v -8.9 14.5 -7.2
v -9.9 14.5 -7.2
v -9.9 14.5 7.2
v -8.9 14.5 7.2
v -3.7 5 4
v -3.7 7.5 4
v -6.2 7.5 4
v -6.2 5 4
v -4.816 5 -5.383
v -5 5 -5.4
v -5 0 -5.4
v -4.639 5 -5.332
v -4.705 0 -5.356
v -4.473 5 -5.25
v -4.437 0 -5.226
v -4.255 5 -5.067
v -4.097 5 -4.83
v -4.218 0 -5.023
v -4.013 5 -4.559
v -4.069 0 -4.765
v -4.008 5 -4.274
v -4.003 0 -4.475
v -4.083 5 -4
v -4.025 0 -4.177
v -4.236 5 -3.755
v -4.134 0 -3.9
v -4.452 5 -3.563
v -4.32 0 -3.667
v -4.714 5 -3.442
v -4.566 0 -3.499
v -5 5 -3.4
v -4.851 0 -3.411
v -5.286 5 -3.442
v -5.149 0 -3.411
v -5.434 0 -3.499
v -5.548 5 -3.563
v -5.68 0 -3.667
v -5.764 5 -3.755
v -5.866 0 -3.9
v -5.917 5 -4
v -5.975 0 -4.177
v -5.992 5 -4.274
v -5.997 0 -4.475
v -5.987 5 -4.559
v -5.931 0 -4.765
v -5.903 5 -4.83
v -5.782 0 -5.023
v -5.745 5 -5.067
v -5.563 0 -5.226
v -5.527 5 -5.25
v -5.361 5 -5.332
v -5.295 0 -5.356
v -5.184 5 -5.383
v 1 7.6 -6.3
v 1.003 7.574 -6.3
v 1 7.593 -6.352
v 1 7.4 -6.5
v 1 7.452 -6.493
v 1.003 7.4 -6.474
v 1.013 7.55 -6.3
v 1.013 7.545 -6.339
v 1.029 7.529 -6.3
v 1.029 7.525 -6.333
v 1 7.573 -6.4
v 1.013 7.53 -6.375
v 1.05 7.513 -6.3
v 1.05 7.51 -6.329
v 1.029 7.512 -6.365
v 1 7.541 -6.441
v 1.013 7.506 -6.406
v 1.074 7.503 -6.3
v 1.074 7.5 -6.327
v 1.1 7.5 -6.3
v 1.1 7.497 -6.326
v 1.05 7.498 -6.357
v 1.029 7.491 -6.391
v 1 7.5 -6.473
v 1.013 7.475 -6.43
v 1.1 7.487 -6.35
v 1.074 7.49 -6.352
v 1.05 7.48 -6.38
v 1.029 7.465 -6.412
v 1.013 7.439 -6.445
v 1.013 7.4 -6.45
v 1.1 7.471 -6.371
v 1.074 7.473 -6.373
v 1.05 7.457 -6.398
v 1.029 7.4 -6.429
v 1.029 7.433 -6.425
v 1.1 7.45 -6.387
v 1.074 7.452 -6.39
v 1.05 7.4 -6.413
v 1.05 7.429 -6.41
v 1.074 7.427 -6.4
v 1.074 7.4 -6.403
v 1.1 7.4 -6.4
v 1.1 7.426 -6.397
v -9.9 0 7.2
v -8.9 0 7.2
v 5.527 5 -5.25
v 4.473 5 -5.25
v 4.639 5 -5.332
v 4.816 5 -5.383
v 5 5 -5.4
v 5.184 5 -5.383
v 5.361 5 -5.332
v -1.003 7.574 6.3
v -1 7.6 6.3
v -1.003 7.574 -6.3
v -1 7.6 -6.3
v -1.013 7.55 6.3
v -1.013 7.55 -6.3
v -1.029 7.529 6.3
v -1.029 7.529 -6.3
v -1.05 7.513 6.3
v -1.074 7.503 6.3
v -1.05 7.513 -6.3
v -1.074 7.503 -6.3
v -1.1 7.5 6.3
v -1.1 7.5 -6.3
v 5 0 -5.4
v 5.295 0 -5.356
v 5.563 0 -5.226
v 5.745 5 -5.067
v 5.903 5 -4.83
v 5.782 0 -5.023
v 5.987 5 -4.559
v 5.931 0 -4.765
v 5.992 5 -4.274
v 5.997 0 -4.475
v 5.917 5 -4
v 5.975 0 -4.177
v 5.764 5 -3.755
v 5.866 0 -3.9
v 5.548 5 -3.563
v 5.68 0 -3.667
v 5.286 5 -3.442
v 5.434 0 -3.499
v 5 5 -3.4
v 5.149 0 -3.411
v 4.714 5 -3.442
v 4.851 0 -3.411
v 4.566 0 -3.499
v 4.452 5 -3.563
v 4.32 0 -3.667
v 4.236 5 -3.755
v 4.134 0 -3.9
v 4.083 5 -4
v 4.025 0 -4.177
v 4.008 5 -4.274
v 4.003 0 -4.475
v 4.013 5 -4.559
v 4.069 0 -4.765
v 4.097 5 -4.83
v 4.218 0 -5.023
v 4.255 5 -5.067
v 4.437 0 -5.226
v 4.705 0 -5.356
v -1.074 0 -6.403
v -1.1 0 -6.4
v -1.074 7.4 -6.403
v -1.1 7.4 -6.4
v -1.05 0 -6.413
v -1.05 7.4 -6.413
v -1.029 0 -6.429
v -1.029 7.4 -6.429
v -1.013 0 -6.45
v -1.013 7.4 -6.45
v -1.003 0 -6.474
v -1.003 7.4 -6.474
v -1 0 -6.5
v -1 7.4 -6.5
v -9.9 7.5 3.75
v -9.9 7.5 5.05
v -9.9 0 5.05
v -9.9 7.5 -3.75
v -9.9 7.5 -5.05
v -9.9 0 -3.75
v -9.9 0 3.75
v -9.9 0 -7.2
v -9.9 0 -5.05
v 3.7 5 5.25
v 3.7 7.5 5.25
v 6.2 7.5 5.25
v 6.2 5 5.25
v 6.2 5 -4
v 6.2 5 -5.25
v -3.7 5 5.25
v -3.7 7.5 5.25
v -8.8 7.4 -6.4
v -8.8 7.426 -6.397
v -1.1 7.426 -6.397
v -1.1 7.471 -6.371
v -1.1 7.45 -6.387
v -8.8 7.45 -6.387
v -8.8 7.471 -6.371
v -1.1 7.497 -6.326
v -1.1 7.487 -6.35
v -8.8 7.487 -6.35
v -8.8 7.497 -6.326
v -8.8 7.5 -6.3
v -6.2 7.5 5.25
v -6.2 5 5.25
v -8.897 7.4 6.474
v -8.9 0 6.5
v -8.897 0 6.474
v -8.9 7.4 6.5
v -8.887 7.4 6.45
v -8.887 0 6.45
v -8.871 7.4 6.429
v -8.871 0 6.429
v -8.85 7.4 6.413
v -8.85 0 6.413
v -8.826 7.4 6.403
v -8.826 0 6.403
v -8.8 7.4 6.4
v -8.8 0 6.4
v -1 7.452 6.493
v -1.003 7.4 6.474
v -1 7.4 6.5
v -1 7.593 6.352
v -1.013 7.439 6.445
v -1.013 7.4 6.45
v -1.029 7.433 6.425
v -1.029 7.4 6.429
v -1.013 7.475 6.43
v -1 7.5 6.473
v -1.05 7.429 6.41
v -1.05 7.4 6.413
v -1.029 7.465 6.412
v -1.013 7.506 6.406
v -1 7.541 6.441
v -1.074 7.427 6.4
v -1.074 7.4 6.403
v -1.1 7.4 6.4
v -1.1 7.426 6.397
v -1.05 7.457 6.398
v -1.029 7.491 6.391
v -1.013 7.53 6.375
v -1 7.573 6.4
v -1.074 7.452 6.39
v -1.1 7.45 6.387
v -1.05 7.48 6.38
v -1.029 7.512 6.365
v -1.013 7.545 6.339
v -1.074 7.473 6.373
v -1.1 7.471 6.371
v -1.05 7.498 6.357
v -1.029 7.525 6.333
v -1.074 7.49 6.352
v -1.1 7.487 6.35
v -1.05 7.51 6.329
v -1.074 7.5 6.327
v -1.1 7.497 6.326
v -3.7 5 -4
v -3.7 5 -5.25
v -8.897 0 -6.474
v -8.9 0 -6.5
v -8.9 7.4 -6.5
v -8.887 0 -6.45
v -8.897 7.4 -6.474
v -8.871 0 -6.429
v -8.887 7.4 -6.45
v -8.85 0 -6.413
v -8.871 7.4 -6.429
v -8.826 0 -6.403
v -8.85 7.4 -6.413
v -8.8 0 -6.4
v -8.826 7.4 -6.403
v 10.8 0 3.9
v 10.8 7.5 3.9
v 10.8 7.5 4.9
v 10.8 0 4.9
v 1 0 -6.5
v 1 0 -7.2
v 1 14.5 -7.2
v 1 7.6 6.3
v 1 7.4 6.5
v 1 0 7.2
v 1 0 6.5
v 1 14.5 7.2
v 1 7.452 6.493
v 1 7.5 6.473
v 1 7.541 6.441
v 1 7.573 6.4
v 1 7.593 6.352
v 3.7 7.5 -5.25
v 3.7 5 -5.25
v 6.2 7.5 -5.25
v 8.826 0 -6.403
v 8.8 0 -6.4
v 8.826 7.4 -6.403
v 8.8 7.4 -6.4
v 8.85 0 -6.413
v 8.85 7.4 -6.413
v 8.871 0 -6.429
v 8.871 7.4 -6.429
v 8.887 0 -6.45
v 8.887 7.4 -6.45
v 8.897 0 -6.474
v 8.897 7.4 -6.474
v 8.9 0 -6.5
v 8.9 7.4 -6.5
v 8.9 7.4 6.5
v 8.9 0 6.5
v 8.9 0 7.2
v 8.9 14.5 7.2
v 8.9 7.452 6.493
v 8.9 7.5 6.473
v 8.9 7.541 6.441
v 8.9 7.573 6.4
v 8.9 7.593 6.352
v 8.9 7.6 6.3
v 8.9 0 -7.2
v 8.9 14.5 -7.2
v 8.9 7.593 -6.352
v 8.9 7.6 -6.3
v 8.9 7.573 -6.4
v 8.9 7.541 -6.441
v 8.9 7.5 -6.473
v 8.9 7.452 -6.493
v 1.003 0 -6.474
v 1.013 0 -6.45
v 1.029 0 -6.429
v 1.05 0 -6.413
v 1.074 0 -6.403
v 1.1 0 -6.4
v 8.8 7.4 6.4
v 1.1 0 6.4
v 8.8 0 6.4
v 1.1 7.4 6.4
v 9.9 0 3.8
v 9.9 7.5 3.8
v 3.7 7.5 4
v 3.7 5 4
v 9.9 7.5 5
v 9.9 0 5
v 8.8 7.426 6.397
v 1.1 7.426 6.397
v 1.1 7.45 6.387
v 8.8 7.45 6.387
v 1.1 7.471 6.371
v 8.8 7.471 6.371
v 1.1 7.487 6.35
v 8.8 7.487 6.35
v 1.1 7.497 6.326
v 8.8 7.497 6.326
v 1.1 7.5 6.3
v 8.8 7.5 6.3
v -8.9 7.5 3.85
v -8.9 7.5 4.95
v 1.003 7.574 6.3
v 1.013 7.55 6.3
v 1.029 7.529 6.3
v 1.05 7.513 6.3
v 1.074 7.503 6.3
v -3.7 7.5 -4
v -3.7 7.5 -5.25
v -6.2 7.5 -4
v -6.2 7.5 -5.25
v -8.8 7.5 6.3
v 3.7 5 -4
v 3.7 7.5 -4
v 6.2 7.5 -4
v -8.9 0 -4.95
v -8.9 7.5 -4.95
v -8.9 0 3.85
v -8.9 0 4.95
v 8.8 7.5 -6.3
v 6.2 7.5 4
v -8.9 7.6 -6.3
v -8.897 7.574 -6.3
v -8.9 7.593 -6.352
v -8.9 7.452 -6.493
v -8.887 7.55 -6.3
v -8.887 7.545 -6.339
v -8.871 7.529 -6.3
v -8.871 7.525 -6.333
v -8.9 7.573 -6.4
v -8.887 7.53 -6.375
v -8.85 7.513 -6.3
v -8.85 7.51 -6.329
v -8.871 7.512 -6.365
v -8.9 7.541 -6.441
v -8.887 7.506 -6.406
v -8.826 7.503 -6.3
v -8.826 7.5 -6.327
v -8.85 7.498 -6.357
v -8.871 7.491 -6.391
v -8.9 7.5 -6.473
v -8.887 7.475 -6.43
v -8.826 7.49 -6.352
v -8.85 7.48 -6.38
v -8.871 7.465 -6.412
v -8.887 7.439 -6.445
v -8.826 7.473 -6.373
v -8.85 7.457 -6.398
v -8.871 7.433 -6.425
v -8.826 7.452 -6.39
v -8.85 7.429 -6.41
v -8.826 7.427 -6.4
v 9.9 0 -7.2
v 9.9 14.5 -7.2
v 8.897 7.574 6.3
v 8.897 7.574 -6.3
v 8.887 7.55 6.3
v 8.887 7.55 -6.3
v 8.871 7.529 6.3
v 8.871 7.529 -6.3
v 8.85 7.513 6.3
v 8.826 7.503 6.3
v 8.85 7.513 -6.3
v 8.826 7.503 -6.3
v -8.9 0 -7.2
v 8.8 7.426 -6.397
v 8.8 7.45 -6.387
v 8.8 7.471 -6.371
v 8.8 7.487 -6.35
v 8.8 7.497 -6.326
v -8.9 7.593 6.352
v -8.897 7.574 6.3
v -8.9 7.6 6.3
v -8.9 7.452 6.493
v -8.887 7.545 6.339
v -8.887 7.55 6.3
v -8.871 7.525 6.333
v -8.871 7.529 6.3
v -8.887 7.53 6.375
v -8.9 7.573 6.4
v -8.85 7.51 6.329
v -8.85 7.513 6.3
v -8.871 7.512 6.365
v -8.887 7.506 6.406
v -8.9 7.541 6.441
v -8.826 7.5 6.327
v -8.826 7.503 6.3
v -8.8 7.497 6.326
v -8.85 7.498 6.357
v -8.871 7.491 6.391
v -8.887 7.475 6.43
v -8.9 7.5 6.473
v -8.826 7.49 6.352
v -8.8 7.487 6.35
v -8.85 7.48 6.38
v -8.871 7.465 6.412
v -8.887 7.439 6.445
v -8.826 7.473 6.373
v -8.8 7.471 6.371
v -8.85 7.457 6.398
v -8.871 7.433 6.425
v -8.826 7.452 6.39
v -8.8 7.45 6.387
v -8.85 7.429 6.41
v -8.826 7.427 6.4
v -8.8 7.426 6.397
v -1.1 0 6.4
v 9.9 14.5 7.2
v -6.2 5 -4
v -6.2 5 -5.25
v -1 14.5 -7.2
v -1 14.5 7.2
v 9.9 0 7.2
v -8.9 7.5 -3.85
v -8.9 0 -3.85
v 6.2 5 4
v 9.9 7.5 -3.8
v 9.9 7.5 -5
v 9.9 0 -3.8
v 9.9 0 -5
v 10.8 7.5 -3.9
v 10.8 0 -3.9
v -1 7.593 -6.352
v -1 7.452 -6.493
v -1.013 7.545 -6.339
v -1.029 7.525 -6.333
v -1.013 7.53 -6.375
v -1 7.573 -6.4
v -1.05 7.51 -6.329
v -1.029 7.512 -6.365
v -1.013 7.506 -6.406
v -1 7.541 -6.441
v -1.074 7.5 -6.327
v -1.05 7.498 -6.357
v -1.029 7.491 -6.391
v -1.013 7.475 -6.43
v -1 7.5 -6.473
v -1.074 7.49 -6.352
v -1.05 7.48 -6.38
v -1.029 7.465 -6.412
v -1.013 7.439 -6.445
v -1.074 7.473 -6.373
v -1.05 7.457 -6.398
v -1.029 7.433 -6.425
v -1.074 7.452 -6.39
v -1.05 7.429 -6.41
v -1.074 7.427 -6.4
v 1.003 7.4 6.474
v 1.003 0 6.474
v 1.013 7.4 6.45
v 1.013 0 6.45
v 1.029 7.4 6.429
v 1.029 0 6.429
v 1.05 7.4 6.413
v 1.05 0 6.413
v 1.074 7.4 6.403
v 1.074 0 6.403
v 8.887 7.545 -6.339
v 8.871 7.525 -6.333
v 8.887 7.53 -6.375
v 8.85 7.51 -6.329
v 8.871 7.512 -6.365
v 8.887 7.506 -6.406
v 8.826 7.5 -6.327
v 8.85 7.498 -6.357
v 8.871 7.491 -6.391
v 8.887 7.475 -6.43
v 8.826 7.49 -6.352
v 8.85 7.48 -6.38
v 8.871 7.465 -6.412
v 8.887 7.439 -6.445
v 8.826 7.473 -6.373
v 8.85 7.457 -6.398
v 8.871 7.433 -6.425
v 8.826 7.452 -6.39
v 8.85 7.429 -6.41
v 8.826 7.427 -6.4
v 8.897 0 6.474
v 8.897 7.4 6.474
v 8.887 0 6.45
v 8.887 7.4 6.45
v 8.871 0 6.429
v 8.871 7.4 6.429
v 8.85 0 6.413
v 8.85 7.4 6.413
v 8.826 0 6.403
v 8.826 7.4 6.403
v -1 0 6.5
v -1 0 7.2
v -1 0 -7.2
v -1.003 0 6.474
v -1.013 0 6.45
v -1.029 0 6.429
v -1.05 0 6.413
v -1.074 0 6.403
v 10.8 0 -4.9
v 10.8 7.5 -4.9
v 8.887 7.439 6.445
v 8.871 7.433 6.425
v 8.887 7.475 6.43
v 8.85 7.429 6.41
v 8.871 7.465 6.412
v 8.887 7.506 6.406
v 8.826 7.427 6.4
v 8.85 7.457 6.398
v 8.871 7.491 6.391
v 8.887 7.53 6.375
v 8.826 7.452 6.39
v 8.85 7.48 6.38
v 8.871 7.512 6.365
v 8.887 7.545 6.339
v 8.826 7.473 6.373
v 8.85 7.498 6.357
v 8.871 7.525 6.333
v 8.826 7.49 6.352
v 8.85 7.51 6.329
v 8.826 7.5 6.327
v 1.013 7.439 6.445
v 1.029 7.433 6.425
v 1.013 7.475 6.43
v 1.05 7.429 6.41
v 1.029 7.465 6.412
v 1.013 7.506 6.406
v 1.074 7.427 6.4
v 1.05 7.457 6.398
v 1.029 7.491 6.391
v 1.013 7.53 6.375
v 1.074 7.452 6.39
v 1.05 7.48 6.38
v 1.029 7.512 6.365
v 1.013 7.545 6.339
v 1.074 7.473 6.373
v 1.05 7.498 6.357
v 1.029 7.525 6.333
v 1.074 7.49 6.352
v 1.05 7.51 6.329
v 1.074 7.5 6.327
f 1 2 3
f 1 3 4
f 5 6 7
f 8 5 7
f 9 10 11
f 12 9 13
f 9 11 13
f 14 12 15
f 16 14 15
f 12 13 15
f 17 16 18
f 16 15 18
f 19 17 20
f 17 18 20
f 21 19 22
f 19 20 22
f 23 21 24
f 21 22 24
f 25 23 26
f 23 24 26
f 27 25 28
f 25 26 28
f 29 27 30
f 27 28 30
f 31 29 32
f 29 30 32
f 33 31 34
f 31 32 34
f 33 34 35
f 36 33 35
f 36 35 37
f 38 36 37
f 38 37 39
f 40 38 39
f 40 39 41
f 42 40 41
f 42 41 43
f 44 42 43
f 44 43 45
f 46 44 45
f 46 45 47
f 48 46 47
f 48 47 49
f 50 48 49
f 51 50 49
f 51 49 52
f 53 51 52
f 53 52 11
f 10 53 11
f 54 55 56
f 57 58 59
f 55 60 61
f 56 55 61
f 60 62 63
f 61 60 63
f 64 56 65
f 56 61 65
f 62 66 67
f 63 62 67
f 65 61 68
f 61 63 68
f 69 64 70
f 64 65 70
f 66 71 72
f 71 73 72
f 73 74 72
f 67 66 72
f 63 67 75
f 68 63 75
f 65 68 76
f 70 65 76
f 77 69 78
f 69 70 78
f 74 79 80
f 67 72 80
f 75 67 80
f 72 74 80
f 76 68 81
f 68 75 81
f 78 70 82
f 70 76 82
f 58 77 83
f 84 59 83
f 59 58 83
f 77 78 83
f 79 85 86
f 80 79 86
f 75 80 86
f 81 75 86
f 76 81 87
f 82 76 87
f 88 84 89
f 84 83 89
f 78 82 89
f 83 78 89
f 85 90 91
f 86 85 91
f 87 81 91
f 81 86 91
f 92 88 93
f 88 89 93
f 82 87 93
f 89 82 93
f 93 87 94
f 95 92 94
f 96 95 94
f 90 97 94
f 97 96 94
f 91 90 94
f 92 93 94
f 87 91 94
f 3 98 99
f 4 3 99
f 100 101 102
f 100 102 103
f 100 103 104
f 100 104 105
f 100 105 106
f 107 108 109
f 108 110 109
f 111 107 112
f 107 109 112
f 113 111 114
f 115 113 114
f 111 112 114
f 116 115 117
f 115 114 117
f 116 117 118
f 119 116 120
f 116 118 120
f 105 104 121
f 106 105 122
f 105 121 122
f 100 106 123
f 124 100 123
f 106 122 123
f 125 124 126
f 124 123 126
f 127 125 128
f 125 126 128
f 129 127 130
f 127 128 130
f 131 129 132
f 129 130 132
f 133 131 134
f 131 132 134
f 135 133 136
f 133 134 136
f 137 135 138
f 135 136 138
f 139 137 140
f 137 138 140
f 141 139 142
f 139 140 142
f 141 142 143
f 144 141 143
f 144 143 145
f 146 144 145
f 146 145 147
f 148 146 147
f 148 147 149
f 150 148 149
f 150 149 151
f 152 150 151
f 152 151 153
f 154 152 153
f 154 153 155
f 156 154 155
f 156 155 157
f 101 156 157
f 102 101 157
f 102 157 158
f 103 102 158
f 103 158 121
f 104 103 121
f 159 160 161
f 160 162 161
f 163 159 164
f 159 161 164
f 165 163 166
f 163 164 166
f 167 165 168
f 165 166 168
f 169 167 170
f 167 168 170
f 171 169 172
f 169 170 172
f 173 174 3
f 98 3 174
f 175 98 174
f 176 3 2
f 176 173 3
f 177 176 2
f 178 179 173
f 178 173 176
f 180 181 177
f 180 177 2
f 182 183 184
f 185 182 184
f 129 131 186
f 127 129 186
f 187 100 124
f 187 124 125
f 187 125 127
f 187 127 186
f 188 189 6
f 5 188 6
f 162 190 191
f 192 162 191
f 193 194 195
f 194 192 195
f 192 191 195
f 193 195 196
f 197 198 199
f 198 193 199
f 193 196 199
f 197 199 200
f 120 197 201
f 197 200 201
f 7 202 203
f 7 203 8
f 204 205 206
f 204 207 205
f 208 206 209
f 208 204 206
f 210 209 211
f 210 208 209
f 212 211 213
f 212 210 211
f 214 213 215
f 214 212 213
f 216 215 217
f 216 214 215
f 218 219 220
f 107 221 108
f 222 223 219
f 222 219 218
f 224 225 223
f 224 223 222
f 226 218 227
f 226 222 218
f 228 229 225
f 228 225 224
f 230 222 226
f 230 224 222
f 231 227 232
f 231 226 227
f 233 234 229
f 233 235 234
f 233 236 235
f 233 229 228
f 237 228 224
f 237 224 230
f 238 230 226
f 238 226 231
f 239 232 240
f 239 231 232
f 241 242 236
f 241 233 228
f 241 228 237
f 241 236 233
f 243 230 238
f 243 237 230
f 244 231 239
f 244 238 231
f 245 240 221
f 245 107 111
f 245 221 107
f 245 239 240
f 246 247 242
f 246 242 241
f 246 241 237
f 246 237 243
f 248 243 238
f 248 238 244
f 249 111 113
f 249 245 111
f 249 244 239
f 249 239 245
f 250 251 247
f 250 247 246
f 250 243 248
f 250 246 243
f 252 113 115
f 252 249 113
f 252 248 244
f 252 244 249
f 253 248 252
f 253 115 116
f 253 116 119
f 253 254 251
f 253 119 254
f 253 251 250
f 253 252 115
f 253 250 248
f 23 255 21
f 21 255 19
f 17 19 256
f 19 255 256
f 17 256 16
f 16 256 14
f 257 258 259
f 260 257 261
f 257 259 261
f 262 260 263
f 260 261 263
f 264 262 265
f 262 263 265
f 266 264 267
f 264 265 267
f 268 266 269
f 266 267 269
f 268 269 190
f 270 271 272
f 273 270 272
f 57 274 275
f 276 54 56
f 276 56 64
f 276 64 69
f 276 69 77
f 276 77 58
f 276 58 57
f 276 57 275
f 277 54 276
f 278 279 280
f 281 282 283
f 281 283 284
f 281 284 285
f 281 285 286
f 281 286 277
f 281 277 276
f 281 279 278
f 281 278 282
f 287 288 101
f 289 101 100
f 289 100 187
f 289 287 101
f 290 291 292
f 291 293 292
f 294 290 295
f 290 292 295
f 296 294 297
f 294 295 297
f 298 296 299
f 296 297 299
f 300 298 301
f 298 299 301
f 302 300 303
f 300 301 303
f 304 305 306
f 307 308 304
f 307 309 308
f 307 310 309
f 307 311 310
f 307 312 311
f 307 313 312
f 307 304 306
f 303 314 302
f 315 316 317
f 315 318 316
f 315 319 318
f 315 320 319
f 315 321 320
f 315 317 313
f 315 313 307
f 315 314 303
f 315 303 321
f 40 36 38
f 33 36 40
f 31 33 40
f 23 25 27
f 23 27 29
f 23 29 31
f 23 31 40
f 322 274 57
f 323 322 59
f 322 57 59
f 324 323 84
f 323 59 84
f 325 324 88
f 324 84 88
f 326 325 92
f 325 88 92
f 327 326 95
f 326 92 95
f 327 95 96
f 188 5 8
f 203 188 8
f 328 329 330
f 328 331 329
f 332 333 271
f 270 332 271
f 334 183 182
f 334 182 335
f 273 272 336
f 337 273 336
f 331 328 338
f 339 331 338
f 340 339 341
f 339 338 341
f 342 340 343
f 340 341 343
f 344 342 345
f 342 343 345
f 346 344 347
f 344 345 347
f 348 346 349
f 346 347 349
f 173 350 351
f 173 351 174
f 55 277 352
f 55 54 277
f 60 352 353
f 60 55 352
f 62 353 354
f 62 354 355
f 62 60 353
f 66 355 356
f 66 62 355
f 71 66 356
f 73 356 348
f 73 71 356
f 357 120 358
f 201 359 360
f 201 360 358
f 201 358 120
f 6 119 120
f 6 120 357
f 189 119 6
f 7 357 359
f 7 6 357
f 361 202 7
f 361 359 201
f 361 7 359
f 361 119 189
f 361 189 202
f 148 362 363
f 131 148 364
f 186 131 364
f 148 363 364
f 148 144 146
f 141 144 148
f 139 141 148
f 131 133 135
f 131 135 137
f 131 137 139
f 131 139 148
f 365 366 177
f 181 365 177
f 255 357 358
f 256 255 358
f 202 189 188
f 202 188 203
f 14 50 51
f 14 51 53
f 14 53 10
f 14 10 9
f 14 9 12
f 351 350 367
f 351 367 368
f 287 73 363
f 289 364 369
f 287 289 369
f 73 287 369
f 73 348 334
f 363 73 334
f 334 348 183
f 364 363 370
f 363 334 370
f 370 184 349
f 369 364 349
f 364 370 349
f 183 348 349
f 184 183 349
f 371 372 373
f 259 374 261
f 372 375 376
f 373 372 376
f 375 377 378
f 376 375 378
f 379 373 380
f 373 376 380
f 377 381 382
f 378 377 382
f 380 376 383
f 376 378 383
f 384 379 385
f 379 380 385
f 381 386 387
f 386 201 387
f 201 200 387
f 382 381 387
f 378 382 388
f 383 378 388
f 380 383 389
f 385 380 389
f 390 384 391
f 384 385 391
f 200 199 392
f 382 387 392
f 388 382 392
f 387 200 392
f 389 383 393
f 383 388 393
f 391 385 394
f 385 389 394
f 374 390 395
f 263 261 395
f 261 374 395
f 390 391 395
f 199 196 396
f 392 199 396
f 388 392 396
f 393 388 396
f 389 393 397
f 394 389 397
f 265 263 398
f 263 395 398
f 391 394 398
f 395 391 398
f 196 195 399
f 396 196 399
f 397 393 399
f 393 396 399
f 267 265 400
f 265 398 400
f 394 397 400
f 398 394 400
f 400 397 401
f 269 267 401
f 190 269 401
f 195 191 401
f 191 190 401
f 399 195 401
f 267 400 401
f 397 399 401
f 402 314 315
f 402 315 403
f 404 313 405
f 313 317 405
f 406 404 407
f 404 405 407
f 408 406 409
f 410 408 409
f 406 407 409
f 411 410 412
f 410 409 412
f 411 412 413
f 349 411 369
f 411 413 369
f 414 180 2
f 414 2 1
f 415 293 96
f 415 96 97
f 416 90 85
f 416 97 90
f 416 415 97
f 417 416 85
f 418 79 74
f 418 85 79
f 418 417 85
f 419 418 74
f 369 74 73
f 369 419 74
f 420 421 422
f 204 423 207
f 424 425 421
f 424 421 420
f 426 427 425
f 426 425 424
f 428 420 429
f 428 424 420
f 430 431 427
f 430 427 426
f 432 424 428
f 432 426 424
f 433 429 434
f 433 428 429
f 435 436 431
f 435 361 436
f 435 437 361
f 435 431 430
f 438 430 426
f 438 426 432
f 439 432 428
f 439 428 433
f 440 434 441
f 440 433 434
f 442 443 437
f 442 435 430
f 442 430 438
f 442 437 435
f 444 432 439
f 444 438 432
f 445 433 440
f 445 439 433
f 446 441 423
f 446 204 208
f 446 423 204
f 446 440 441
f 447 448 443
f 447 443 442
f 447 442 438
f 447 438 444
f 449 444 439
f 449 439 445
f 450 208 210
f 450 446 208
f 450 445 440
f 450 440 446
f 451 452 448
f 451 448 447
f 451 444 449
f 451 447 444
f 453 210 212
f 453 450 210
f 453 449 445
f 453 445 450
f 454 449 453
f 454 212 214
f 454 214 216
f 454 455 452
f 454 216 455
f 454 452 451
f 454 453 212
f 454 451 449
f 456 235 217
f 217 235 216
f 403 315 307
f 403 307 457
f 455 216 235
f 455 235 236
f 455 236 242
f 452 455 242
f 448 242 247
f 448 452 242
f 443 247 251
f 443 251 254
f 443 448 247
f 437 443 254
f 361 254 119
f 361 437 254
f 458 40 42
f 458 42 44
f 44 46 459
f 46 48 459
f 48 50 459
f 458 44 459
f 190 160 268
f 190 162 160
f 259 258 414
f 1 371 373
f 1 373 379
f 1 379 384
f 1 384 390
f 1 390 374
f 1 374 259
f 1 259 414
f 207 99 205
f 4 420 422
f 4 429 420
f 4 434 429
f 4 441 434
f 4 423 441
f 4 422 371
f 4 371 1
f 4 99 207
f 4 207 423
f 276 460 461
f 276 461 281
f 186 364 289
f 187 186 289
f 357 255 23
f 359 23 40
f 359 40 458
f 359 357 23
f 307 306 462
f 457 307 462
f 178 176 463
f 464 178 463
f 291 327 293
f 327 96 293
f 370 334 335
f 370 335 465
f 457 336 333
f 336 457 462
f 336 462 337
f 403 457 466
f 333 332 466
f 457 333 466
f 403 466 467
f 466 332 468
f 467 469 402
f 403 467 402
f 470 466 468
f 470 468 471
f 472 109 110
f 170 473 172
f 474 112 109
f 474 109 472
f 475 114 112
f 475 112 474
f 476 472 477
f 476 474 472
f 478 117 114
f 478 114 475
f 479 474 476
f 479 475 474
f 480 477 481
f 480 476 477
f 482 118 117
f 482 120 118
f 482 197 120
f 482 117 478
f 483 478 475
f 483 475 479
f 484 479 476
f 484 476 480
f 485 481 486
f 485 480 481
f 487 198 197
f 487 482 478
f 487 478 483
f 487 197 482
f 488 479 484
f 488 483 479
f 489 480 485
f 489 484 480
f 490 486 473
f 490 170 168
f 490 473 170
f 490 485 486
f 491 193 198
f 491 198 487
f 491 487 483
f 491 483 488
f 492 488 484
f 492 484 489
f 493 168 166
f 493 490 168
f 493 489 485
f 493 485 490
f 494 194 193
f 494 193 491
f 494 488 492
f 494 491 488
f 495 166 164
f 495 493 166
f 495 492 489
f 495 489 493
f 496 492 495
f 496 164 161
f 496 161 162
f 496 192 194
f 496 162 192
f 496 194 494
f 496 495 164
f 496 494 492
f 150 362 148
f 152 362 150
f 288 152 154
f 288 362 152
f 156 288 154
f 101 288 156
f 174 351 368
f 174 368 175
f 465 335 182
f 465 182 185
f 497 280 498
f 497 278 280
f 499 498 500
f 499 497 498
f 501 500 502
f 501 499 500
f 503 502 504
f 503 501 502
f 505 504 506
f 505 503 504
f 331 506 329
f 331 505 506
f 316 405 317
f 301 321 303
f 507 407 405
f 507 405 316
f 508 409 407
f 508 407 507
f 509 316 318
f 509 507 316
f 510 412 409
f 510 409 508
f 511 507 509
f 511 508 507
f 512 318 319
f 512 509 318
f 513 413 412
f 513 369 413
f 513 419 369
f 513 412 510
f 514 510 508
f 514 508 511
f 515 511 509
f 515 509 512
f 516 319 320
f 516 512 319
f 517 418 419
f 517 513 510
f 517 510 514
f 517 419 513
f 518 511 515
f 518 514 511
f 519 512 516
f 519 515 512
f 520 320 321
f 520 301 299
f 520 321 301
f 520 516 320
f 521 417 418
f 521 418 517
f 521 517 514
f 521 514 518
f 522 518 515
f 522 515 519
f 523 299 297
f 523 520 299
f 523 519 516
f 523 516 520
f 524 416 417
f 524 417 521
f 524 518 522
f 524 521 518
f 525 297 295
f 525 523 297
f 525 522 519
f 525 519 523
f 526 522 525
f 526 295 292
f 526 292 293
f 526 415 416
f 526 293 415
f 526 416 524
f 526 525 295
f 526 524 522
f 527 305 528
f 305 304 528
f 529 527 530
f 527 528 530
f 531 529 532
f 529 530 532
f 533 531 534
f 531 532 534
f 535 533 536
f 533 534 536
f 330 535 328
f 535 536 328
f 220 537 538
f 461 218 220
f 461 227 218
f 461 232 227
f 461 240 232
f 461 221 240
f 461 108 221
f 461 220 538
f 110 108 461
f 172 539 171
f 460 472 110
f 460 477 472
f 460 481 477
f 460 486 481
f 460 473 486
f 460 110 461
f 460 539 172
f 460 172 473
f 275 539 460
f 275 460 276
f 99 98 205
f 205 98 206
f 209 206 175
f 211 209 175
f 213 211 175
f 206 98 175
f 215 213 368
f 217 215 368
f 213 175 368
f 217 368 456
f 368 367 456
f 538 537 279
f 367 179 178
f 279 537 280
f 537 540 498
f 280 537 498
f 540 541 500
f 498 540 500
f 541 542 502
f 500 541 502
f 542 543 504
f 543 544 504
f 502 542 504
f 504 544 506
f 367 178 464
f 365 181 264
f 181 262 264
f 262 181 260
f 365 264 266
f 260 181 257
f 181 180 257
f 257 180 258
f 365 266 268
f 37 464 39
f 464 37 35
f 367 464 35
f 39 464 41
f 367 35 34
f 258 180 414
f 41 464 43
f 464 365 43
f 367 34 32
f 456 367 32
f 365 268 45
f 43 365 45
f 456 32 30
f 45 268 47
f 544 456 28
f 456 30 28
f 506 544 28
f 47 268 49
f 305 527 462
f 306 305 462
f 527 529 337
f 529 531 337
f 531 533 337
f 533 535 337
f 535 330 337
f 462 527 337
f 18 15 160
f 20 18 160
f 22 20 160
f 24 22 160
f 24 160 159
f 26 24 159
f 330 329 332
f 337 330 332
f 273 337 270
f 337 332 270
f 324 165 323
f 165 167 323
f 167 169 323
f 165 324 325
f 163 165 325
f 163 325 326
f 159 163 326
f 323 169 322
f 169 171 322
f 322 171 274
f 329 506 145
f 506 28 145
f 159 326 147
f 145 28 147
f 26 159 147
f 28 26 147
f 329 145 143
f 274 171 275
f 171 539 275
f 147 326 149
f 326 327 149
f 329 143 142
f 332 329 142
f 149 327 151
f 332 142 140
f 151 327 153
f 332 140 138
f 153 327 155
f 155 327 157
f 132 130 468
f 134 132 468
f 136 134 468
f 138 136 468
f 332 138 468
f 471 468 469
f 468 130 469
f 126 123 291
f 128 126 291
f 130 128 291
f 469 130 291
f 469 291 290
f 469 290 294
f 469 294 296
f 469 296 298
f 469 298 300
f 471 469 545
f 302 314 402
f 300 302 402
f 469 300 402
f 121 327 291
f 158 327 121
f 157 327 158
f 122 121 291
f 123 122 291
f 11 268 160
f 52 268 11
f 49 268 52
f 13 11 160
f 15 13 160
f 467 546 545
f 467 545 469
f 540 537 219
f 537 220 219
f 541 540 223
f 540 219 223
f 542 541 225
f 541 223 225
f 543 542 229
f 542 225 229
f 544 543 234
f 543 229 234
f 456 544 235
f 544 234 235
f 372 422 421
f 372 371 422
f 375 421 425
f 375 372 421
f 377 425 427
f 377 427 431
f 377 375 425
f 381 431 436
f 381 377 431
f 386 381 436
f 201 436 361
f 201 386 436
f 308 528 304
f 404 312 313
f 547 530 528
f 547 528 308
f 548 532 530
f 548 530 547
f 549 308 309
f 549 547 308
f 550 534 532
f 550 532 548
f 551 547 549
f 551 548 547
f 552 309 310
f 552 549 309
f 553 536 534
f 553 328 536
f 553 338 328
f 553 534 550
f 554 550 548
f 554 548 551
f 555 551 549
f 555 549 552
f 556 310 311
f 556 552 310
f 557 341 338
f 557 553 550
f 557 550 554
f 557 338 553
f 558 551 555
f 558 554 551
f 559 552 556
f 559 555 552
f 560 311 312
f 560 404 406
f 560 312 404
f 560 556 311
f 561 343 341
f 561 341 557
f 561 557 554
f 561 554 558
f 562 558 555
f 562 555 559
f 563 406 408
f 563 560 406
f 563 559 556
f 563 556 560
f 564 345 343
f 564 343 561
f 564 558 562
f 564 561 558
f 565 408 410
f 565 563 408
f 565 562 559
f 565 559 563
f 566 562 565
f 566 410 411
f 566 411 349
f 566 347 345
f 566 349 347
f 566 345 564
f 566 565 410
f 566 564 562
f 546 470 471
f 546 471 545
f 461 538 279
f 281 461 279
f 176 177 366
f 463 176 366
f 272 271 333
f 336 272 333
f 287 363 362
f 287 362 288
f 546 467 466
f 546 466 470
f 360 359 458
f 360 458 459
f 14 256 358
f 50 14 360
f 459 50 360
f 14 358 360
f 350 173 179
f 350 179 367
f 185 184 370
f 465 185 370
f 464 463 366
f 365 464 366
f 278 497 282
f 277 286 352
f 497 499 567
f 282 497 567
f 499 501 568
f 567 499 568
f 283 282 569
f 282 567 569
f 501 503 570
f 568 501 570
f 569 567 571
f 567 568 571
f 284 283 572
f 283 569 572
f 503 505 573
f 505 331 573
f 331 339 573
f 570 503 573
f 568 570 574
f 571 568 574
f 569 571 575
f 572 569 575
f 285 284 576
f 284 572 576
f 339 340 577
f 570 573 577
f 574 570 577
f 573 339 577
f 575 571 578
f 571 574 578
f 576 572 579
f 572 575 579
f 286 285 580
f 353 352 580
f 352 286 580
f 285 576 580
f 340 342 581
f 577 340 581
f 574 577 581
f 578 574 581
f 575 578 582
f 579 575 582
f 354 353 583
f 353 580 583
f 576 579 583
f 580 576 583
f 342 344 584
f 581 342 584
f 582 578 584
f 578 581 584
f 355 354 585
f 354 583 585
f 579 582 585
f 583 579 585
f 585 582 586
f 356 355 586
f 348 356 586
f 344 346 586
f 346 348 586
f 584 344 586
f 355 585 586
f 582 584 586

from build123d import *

# Parameters (mm, degrees)
SKETCH1_W               = 19.8
SKETCH1_H               = 14.4
BOSS_EXTRUDE1_DEPTH     = 14.5
SKETCH3_W               = 7.9
SKETCH3_H               = 14.5
CUT_EXTRUDE1_DEPTH      = 0.8
SKETCH4_W               = 7.9
SKETCH4_H               = 7
CUT_EXTRUDE2_DEPTH      = 23.208556909
MIRROR2_COPY_1_SKETCH_W = 7.9
MIRROR2_COPY_1_SKETCH_H = 14.5
MIRROR2_COPY_1_DEPTH    = 0.8
BOSS_EXTRUDE2_DEPTH     = 7.5
FILLET1_R               = 0.1
CUT_EXTRUDE3_DEPTH      = 7.5
SKETCH7_R               = 1
CUT_EXTRUDE4_DEPTH      = 5
SKETCH8_W               = 2.5
SKETCH8_H               = 1.25
CUT_EXTRUDE5_DEPTH      = 2.5


with BuildPart() as part:
    # Sketch1 → Boss-Extrude1 (new body)
    with BuildSketch(Plane(origin=(0, 0, 0), x_dir=(1, 0, 0), z_dir=(0, 1, 0))):
        Rectangle(SKETCH1_W, SKETCH1_H)
    extrude(amount=BOSS_EXTRUDE1_DEPTH)

    # Sketch3 → Cut-Extrude1 (cut)
    with BuildSketch(Plane.XY.offset(7.2)):
        with Locations((4.95, 7.25)):
            Rectangle(SKETCH3_W, SKETCH3_H)
    cut_extrude1 = extrude(amount=-CUT_EXTRUDE1_DEPTH, mode=Mode.SUBTRACT)

    # Mirror1: Cut-Extrude1 across plane
    add(cut_extrude1.mirror(Plane.XY), mode=Mode.SUBTRACT)

    # Sketch4 → Cut-Extrude2 (cut, through all)
    with BuildSketch(Plane.XY.offset(6.4)):
        with Locations((4.95, 11)):
            Rectangle(SKETCH4_W, SKETCH4_H)
    cut_extrude2 = extrude(amount=-CUT_EXTRUDE2_DEPTH, mode=Mode.SUBTRACT)

    # Mirror2: Cut-Extrude1, Cut-Extrude2 across plane
    add(cut_extrude1.mirror(Plane(origin=(0, 0, 0), x_dir=(0, 0, 1), z_dir=(1, 0, 0))), mode=Mode.SUBTRACT)
    add(cut_extrude2.mirror(Plane(origin=(0, 0, 0), x_dir=(0, 0, 1), z_dir=(1, 0, 0))), mode=Mode.SUBTRACT)

    # Mirror2 copy 1 sketch → Mirror2 copy 1 (cut)
    with BuildSketch(Plane(origin=(0, 0, -7.2), x_dir=(-1, 0, 0), z_dir=(0, 0, -1))):
        with Locations((4.95, 7.25)):
            Rectangle(MIRROR2_COPY_1_SKETCH_W, MIRROR2_COPY_1_SKETCH_H)
    extrude(amount=-MIRROR2_COPY_1_DEPTH, mode=Mode.SUBTRACT)

    # Sketch5 → Boss-Extrude2 (add)
    with BuildSketch(Plane(origin=(0, 7.5, 0), x_dir=(1, 0, 0), z_dir=(0, 1, 0))):
        Polygon((9.9, 5), (9.9, 3.8), (10.8, 3.9), (10.8, 4.9), align=None)
        Polygon((9.9, -5), (9.9, -3.8), (10.8, -3.9), (10.8, -4.9), align=None)
    extrude(amount=-BOSS_EXTRUDE2_DEPTH)

    # Fillet1
    fillet1_edges = [part.edges().sort_by_distance(p)[0] for p in [
        (-8.9, 3.75, 6.4),
        (-1, 3.75, 6.4),
        (8.9, 3.75, 6.4),
        (8.9, 3.75, -6.4),
        (1, 3.75, -6.4),
        (4.95, 7.5, -6.4),
        (1, 3.75, 6.4),
        (1, 7.5, 0),
        (8.9, 7.5, 0),
        (4.95, 7.5, 6.4),
        (-8.9, 3.75, -6.4),
        (-1, 3.75, -6.4),
        (-4.95, 7.5, -6.4),
        (-1, 7.5, 0),
        (-4.95, 7.5, 6.4),
        (-8.9, 7.5, 0),
    ]]
    fillet(fillet1_edges, radius=FILLET1_R)

    # Sketch6 → Cut-Extrude3 (cut)
    with BuildSketch(Plane(origin=(0, 7.5, 0), x_dir=(1, 0, 0), z_dir=(0, 1, 0))):
        Polygon((-9.9, 5.05), (-9.9, 3.75), (-8.9, 3.85), (-8.9, 4.95), align=None)
        Polygon((-9.9, -5.05), (-9.9, -3.75), (-8.9, -3.85), (-8.9, -4.95), align=None)
    extrude(amount=-CUT_EXTRUDE3_DEPTH, mode=Mode.SUBTRACT)

    # Sketch7 → Cut-Extrude4 (cut)
    with BuildSketch(Plane.XZ):
        with Locations(Location((-5, -4.4, 0), (0, 0, 270))):
            Circle(SKETCH7_R)
        with Locations(Location((5, -4.4, 0), (0, 0, 270))):
            Circle(SKETCH7_R)
    extrude(amount=-CUT_EXTRUDE4_DEPTH, mode=Mode.SUBTRACT)

    # Sketch8 → Cut-Extrude5 (cut)
    with BuildSketch(Plane(origin=(0, 7.5, 0), x_dir=(1, 0, 0), z_dir=(0, 1, 0))):
        with Locations((4.95, 4.625)):
            Rectangle(SKETCH8_W, SKETCH8_H)
        with Locations((4.95, -4.625)):
            Rectangle(SKETCH8_W, SKETCH8_H)
    cut_extrude5 = extrude(amount=-CUT_EXTRUDE5_DEPTH, mode=Mode.SUBTRACT)

    # Mirror3: Cut-Extrude5 across plane
    add(cut_extrude5.mirror(Plane(origin=(0, 0, 0), x_dir=(0, 0, 1), z_dir=(1, 0, 0))), mode=Mode.SUBTRACT)


solid = part.part
